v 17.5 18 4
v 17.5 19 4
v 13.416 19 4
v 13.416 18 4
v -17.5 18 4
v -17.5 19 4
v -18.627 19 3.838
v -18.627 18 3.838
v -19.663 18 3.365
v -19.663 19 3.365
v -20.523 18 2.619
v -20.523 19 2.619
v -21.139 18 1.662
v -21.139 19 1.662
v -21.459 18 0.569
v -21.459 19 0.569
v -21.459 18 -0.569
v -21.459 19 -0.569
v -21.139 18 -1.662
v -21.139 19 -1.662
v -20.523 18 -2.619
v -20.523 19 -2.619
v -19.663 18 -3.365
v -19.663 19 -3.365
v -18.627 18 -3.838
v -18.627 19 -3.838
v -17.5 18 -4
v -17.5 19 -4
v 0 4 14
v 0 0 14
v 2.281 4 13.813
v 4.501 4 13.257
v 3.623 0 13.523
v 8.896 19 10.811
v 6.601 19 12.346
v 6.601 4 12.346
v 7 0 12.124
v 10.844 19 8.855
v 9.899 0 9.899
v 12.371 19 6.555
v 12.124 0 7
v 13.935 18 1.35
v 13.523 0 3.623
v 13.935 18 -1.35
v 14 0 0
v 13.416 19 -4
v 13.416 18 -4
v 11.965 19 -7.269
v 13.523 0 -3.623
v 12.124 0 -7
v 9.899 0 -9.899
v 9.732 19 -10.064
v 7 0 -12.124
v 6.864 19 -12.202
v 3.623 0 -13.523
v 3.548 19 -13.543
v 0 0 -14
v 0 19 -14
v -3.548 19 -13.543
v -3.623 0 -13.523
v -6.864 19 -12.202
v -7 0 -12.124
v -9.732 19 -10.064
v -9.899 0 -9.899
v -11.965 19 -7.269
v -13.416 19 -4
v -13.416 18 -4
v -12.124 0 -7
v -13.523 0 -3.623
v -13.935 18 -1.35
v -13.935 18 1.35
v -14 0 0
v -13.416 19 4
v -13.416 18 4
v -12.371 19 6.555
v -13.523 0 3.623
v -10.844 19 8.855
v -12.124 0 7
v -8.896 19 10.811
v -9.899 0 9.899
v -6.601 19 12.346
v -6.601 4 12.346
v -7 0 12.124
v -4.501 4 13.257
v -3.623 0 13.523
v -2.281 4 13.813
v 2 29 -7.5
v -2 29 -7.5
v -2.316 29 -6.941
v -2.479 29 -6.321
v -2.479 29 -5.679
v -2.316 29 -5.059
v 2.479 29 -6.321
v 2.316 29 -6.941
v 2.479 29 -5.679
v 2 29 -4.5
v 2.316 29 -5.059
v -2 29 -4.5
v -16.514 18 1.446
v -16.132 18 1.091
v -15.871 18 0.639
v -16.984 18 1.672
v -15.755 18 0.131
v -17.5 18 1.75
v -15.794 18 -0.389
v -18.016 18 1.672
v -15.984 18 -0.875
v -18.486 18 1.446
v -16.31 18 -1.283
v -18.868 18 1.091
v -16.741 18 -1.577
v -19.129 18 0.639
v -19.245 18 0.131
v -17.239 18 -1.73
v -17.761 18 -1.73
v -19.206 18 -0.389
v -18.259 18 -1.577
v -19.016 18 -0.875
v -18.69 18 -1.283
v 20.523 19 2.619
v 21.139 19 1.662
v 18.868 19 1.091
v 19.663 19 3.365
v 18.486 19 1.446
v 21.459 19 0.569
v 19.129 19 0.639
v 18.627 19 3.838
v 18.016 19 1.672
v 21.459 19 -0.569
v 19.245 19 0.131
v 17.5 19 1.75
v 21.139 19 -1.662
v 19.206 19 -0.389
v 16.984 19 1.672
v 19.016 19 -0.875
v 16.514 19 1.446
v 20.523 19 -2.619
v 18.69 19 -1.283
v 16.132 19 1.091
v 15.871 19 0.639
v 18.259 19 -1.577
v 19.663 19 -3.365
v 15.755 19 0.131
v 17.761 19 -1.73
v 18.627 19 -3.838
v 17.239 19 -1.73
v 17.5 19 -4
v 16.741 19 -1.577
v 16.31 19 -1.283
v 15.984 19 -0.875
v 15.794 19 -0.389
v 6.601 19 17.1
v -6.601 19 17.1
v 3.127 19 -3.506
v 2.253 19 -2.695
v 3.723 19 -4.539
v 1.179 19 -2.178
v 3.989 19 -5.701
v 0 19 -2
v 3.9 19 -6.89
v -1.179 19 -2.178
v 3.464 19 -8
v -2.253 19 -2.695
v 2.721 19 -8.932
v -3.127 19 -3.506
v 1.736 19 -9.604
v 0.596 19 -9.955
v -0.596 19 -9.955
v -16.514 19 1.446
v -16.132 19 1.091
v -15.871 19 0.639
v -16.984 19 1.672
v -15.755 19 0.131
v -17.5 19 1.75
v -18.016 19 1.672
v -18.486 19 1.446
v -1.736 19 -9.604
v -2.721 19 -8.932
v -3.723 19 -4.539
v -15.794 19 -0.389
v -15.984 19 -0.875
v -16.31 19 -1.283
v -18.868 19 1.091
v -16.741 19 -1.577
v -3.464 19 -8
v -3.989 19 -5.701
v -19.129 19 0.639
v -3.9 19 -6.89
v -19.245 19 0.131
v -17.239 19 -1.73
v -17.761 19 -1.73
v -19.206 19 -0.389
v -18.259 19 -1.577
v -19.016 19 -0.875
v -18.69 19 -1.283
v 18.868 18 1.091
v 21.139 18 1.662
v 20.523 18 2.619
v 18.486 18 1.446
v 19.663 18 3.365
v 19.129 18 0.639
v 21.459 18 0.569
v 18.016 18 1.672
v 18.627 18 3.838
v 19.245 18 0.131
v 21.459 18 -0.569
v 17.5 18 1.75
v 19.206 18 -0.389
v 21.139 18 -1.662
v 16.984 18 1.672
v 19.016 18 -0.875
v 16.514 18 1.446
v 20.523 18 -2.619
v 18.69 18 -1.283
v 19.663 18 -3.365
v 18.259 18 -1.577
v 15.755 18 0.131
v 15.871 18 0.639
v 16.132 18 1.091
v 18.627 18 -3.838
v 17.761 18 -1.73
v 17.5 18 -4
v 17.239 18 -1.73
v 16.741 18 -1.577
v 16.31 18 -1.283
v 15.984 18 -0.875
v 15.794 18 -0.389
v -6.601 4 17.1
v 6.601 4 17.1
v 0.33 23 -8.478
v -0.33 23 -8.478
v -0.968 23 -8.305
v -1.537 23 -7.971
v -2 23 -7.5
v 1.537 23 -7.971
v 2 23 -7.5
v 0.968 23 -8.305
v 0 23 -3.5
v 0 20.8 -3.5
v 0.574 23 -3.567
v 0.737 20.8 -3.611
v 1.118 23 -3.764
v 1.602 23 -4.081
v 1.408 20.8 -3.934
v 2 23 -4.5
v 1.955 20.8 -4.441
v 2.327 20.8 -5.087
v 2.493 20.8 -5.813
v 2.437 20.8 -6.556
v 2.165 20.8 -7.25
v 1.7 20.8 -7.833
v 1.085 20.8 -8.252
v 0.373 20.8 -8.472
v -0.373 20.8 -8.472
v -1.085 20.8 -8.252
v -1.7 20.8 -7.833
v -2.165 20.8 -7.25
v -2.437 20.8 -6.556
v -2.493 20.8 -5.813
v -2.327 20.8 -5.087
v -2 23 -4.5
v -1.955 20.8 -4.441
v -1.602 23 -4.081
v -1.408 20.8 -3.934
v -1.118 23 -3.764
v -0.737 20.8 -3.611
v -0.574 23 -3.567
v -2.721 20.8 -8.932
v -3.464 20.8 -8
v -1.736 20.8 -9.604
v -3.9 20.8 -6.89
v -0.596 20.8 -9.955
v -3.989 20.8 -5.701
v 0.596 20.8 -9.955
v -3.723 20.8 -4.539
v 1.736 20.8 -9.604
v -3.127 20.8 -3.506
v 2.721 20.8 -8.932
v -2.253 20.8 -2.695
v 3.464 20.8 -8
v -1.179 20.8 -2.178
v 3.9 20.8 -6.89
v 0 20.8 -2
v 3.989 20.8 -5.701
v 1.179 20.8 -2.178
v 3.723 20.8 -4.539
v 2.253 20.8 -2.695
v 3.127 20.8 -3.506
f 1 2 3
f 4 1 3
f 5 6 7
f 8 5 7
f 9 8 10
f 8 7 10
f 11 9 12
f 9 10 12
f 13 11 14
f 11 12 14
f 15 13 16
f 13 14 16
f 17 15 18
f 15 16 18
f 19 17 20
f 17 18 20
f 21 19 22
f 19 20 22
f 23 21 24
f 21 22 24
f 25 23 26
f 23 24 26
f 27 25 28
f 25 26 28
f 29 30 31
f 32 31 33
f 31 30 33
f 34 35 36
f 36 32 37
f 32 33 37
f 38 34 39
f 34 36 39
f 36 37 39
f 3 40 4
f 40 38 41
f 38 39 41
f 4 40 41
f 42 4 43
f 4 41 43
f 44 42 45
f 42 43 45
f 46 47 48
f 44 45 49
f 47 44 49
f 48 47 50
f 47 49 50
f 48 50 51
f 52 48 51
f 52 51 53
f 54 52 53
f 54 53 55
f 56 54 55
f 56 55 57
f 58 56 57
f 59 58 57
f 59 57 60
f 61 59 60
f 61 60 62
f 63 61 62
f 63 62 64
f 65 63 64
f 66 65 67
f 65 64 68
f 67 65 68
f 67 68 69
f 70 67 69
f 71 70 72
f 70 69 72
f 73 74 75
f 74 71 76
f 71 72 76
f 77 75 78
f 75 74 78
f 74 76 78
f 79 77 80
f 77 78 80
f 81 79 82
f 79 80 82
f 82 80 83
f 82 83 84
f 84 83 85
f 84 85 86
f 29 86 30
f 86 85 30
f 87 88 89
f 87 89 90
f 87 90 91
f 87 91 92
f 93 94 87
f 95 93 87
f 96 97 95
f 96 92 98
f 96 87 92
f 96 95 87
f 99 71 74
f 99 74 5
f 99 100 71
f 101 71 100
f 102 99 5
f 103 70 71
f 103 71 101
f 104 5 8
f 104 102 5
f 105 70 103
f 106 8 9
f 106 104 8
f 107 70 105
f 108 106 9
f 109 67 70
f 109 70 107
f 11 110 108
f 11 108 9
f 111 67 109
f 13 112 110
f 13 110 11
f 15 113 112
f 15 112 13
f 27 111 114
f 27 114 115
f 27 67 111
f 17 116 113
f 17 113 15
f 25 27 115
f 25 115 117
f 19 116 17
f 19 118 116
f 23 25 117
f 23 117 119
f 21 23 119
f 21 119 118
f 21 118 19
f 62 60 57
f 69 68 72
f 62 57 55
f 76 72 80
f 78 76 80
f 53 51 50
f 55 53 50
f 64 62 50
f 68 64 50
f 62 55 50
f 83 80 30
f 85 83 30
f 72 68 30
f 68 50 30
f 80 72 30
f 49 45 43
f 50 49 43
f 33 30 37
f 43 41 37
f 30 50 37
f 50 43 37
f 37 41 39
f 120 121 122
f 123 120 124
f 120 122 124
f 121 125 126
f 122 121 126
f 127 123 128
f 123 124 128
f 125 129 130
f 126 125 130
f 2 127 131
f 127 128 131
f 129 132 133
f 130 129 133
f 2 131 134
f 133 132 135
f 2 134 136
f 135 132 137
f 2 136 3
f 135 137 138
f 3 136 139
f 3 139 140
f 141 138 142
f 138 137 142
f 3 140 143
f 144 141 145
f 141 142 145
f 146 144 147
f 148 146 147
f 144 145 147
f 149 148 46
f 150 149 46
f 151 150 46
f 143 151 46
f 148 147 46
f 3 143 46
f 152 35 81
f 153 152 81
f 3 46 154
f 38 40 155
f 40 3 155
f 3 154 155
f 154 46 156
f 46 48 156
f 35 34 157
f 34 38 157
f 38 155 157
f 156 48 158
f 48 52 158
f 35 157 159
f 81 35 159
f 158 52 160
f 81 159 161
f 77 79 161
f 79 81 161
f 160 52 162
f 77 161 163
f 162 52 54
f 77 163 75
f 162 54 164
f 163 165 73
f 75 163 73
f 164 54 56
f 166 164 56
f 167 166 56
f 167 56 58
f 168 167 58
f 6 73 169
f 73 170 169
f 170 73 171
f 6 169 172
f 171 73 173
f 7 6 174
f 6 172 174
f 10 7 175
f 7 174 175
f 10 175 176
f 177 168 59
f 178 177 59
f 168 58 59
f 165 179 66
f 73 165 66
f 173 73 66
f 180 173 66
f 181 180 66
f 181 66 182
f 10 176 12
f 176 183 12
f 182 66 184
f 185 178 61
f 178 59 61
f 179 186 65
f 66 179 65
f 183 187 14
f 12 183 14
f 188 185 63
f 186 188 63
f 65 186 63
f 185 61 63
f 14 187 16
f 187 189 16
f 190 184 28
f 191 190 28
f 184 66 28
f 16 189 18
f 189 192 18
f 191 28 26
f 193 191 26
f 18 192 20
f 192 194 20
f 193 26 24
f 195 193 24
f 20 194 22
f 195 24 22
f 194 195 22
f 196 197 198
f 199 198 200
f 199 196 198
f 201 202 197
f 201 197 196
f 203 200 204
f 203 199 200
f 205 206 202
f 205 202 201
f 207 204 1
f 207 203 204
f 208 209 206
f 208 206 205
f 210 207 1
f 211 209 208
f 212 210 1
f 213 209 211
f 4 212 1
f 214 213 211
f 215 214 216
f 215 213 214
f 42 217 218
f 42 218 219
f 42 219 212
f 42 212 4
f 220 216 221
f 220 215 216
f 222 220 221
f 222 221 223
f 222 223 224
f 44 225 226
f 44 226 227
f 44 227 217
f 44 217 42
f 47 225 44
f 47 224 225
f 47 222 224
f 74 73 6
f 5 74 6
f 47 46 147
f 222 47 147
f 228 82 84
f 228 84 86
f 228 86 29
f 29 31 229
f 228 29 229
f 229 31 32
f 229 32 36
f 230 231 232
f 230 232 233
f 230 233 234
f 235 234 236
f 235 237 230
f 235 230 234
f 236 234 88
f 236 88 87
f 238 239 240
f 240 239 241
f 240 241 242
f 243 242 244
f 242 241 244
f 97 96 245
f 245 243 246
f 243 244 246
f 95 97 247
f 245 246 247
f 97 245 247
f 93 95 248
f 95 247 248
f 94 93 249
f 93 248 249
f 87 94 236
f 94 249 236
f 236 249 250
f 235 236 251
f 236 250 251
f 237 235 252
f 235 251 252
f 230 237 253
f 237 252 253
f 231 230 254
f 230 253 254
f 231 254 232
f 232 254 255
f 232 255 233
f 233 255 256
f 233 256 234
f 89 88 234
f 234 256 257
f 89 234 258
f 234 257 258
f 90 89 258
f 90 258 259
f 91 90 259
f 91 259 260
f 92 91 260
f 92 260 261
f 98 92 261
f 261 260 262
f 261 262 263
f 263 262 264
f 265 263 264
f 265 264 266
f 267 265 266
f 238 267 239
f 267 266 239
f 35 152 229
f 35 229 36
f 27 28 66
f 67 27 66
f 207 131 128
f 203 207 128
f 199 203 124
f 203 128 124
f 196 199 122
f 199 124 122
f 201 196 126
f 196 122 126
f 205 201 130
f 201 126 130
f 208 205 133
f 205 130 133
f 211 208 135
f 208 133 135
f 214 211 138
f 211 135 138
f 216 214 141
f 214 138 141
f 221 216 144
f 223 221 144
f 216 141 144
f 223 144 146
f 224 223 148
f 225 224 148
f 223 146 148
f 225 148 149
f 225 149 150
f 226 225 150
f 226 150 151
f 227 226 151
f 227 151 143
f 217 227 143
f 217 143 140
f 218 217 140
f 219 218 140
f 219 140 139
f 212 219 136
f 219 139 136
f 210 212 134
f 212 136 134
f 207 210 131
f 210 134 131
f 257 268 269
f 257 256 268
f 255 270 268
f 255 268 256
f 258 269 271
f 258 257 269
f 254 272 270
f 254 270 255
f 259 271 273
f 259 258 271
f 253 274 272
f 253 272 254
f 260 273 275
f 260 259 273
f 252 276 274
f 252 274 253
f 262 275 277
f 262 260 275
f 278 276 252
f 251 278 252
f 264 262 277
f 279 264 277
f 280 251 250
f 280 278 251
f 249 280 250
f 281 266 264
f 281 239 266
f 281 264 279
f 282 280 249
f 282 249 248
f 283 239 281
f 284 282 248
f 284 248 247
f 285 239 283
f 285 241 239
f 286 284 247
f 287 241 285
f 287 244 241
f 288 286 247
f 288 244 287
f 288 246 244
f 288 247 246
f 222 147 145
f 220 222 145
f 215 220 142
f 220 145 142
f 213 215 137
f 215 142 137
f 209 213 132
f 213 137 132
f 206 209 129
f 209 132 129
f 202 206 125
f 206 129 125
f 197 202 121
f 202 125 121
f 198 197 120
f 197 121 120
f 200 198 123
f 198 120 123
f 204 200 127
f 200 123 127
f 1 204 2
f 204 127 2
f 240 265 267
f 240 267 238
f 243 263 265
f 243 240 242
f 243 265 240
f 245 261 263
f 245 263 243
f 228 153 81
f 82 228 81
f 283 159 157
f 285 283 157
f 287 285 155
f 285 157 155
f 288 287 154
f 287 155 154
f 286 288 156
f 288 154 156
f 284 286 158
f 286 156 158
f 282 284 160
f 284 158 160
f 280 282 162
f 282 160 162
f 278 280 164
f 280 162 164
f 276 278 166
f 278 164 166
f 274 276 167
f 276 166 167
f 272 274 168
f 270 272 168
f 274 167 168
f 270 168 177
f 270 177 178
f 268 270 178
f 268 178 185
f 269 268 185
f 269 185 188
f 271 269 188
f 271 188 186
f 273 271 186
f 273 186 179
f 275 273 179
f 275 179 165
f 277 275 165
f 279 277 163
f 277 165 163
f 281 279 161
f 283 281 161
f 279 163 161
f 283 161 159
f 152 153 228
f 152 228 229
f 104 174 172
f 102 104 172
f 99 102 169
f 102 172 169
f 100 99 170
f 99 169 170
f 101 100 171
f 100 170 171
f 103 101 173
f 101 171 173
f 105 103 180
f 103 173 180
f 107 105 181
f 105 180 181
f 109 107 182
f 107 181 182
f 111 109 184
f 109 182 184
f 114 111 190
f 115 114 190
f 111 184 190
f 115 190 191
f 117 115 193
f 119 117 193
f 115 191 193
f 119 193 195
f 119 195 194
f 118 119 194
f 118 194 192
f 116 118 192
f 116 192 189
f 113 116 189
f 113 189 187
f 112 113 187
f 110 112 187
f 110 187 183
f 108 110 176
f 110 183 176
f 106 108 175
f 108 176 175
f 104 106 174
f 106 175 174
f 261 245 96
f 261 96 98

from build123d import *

# Parameters (mm, degrees)
SKETCH_1_R          = 14
EXTRUDE_1_DEPTH     = 19
SKETCH_2_W          = 13.202760332
SKETCH_2_H          = 6.2
EXTRUDE_2_DEPTH     = 15
SKETCH_3_R          = 1.75
EXTRUDE_3_DEPTH     = 1
SKETCH_4_R          = 4
EXTRUDE_4_DEPTH     = 1.8
SKETCH_5_R          = 2.5
EXTRUDE_5_DEPTH     = 8.2
CUT_EXTRUDE_START   = -6
CUT_EXTRUDE_1_DEPTH = 6


with BuildPart() as part:
    # 草图1 → 凸台-拉伸1 (new body)
    with BuildSketch(Plane(origin=(0, 0, 0), x_dir=(1, 0, 0), z_dir=(0, 1, 0))):
        with Locations(Location((0, 0, 0), (0, 0, 270))):
            Circle(SKETCH_1_R)
    extrude(amount=EXTRUDE_1_DEPTH)

    # 草图2 → 凸台-拉伸2 (add)
    with BuildSketch(Plane(origin=(0, 19, 0), x_dir=(1, 0, 0), z_dir=(0, 1, 0))):
        with Locations((0, -14)):
            Rectangle(SKETCH_2_W, SKETCH_2_H)
    extrude(amount=-EXTRUDE_2_DEPTH)

    # 草图3 → 凸台-拉伸3 (add)
    with BuildSketch(Plane(origin=(0, 19, 0), x_dir=(1, 0, 0), z_dir=(0, 1, 0))):
        with BuildLine():
            Line((17.5, -4), (-17.5, -4))
            ThreePointArc((-17.5, -4), (-21.5, 0), (-17.5, 4))
            Line((-17.5, 4), (17.5, 4))
            ThreePointArc((17.5, 4), (21.5, 0), (17.5, -4))
        make_face()
        with Locations(Location((-17.5, 0, 0), (0, 0, 270))):
            Circle(SKETCH_3_R, mode=Mode.SUBTRACT)
        with Locations(Location((17.5, 0, 0), (0, 0, 270))):
            Circle(SKETCH_3_R, mode=Mode.SUBTRACT)
    extrude(amount=-EXTRUDE_3_DEPTH)

    # 草图4 → 凸台-拉伸4 (add)
    with BuildSketch(Plane(origin=(0, 19, 0), x_dir=(1, 0, 0), z_dir=(0, 1, 0))):
        with Locations(Location((0, 6, 0), (0, 0, 270))):
            Circle(SKETCH_4_R)
    extrude(amount=EXTRUDE_4_DEPTH)

    # 草图5 → 凸台-拉伸5 (add)
    with BuildSketch(Plane(origin=(0, 20.8, 0), x_dir=(1, 0, 0), z_dir=(0, 1, 0))):
        with Locations(Location((0, 6, 0), (0, 0, 270))):
            Circle(SKETCH_5_R)
    extrude(amount=EXTRUDE_5_DEPTH)

    # 草图6 → 切除-拉伸1 (cut)
    with BuildSketch(Plane(origin=(0, 29, 0), x_dir=(1, 0, 0), z_dir=(0, 1, 0)).offset(CUT_EXTRUDE_START)):
        with BuildLine():
            Line((2, 4.5), (-2, 4.5))
            ThreePointArc((-2, 4.5), (0, 3.5), (2, 4.5))
        make_face()
        with BuildLine():
            Line((-2, 7.5), (2, 7.5))
            ThreePointArc((2, 7.5), (0, 8.5), (-2, 7.5))
        make_face()
    extrude(amount=CUT_EXTRUDE_1_DEPTH, mode=Mode.SUBTRACT)


solid = part.part
